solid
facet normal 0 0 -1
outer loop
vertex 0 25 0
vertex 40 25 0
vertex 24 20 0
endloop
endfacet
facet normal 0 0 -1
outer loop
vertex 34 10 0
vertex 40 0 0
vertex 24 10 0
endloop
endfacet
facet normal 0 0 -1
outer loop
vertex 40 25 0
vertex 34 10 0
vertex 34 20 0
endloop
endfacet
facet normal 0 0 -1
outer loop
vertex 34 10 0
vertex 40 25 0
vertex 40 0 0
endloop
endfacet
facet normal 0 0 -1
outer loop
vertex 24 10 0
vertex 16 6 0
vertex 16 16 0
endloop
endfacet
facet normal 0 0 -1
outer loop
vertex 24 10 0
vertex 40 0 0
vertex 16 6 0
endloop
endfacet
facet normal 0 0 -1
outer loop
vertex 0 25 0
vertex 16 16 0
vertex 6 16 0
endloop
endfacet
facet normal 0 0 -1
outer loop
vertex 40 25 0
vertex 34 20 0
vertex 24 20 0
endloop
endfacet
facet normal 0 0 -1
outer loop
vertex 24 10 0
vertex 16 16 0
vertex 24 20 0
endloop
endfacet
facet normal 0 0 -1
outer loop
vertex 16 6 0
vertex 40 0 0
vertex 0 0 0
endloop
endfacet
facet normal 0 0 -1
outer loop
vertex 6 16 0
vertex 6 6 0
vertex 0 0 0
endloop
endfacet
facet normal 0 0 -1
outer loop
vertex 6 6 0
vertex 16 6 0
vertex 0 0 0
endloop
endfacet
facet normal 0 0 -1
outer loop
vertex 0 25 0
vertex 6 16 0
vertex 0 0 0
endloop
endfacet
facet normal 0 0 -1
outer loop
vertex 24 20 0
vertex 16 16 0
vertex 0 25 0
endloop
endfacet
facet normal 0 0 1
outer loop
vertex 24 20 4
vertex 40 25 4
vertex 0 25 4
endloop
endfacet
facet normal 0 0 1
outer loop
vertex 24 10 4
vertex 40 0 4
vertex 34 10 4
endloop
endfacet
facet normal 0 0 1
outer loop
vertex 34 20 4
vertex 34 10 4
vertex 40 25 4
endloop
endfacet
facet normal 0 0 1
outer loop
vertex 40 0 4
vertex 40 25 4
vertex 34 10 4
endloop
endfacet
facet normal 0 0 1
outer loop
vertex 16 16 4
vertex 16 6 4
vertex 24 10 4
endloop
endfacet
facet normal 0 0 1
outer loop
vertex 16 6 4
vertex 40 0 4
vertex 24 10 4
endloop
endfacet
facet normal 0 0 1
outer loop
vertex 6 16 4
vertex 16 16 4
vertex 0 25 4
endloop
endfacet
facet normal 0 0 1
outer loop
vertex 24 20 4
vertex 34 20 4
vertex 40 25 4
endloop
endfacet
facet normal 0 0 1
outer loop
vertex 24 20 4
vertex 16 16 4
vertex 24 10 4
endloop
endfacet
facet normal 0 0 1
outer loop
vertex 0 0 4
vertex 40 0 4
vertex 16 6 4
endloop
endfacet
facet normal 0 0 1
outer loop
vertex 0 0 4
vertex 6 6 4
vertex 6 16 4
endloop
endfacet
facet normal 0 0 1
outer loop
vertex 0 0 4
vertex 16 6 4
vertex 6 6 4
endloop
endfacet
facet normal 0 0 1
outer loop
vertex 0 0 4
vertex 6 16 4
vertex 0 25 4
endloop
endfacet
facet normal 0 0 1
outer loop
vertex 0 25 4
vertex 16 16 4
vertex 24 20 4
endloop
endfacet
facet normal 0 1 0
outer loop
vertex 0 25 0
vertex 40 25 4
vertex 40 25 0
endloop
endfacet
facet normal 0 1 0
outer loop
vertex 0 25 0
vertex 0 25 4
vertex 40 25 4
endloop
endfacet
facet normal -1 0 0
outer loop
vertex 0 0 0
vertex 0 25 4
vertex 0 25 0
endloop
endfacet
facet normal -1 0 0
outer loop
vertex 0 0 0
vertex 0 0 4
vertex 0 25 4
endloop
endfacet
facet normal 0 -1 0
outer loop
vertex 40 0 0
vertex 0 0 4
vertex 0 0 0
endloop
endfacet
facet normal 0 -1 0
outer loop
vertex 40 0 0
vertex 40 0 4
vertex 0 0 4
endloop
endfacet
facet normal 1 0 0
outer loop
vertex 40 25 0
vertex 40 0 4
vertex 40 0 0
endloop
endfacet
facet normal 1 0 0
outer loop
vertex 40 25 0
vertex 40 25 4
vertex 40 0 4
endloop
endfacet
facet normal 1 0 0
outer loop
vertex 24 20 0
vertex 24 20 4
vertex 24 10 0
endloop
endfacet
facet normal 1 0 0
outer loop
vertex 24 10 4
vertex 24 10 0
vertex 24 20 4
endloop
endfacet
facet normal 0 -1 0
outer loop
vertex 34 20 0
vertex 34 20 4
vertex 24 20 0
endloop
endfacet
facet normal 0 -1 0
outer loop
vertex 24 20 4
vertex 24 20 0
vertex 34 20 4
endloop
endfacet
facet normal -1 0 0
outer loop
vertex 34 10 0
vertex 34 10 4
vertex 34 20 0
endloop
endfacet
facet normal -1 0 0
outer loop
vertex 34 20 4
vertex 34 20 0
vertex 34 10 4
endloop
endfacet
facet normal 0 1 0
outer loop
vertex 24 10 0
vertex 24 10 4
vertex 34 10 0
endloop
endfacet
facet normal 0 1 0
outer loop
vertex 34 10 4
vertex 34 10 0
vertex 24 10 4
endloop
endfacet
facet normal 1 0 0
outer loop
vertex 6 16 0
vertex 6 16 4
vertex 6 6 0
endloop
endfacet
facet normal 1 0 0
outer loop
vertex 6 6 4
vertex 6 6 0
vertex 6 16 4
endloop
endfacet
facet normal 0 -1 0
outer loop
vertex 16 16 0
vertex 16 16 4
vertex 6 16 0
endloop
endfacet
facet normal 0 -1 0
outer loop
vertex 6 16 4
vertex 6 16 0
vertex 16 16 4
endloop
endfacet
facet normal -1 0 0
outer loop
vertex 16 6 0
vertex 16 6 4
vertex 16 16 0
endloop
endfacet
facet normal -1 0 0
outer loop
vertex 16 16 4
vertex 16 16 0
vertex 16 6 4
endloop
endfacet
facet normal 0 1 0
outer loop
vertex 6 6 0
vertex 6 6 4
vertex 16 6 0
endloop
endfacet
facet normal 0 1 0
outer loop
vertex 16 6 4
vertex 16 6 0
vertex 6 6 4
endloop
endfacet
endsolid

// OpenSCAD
// polygon(paths=): OpenSCAD fills every path even-odd — here a boundary and two holes
linear_extrude(4) polygon(
    points = [[0,0],[40,0],[40,25],[0,25], [6,6],[16,6],[16,16],[6,16], [24,10],[34,10],[34,20],[24,20]],
    paths = [[0,1,2,3], [4,5,6,7], [8,9,10,11]]
);
